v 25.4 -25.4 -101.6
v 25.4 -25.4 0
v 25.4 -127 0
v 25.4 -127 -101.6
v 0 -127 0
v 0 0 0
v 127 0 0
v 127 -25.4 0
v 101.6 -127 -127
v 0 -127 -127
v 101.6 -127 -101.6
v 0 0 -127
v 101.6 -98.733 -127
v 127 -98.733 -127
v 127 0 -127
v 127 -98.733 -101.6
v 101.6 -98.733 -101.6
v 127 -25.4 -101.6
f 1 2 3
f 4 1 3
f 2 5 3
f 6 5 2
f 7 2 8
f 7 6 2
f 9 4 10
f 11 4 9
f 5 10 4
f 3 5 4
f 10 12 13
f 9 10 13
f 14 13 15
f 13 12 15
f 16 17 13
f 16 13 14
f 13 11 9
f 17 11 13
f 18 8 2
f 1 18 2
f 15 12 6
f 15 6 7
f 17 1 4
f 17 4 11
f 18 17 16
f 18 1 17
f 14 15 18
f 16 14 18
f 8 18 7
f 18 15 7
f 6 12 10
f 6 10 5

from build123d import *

# Parameters (mm, degrees)
F0_W     = 126.9999751441
F0_H     = 127
F1_DEPTH = 127
F2_W     = 25.4
F2_H     = 28.2670979543
F3_DEPTH = 127
F5_DEPTH = 101.6


# Not quite as in the source:
# - a feature names something its author has since deleted; it is built from what else it names


with BuildPart() as f1:
    # F0 (on Front) → F1 (new body)
    with BuildSketch(Plane.XZ):
        with Locations((63.4999875721, -63.5)):
            Rectangle(F0_W, F0_H)
    extrude(amount=F1_DEPTH)

    # F2 (on face) → F3 (cut)
    with BuildSketch(Plane.XY):
        with Locations((114.2999751441, -112.8664510228)):
            Rectangle(F2_W, F2_H)
    extrude(amount=-F3_DEPTH, mode=Mode.SUBTRACT)

    # F4 (on face) → F5 (cut)
    with BuildSketch(Plane.XY):
        Polygon((25.3999751441, -25.4), (25.3999751441, -127), (101.5999751441, -127), (101.5999751441, -98.7329020457), (126.9999751441, -98.7329020457), (126.9999751441, -25.4), align=None)
    extrude(amount=-F5_DEPTH, mode=Mode.SUBTRACT)


solid = f1.part
